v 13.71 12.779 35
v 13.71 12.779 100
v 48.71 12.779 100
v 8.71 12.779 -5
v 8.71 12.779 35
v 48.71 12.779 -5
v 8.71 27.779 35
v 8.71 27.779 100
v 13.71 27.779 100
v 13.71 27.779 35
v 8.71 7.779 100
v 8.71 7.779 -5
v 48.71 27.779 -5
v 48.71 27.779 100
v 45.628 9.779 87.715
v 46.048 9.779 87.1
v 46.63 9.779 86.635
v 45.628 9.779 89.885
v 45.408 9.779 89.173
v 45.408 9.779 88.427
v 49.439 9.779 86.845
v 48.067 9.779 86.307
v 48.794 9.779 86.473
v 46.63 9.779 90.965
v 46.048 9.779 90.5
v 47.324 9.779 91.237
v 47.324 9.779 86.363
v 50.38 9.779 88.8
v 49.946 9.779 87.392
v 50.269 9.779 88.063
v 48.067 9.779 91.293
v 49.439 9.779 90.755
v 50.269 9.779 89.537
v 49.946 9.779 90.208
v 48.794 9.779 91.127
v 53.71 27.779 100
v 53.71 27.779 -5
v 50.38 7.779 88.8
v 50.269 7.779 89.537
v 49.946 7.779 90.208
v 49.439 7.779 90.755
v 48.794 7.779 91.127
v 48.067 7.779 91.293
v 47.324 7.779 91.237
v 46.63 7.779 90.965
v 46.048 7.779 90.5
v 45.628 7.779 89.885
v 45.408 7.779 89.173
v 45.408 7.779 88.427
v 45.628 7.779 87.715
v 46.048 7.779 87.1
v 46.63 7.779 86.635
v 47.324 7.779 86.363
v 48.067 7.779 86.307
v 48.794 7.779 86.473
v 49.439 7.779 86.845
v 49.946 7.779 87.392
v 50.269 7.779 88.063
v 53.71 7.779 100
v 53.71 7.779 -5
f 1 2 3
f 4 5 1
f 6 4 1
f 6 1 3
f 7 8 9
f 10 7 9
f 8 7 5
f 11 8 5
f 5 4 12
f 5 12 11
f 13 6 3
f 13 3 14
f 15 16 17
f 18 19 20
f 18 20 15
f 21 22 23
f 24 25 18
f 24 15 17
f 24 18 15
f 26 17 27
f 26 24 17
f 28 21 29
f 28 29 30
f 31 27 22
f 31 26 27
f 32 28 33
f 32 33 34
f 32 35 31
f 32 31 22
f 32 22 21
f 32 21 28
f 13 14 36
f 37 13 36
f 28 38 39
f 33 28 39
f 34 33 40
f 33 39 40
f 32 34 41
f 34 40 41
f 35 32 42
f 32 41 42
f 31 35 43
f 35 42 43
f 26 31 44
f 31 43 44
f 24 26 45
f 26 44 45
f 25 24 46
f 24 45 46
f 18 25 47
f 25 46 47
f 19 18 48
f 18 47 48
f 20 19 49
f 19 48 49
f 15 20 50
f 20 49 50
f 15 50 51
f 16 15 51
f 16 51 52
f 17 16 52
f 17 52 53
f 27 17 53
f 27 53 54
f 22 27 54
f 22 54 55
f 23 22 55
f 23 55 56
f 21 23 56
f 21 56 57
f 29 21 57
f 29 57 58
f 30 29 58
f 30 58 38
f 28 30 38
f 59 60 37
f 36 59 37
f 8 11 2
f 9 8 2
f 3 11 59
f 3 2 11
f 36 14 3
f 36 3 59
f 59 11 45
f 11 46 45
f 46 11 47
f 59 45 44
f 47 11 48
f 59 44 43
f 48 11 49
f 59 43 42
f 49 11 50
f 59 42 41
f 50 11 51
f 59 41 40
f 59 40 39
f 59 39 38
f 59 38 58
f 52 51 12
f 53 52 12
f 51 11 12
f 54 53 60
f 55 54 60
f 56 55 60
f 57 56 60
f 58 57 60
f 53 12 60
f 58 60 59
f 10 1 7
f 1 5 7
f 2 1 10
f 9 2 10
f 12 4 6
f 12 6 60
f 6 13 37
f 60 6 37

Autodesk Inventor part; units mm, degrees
ref_plane "YZ Plane" through (0, 0, 0) normal (1, 0, 0) x (0, 1, 0)
ref_plane "XZ Plane" through (0, 0, 0) normal (0, 1, 0) x (-1, 0, 0)
ref_plane "XY Plane" through (0, 0, 0) normal (0, 0, 1) x (1, 0, 0)
sketch "Sketch1" plane through (0, 0, 0) normal (0, 0, 1) x (1, 0, 0)
  line L0 (13.7104, 12.7791) -> (48.7104, 12.7791)
  line L1 (48.7104, 12.7791) -> (48.7104, 27.7791)
  line L2 (13.7104, 12.7791) -> (13.7104, 27.7791)
  line L3 (8.7104, 27.7791) -> (8.7104, 7.7791)
  line L4 (8.7104, 7.7791) -> (53.7104, 7.7791)
  line L5 (53.7104, 7.7791) -> (53.7104, 27.7791)
  line L6 (8.7104, 27.7791) -> (13.7104, 27.7791)
  line L7 (48.7104, 27.7791) -> (53.7104, 27.7791)
  point P0 (0, 0)
  dimension "d0" = 35
  dimension "d1" = 15
  dimension "d2" = 15
  dimension "d3" = 5
extrude "Extrusion1" add sketch "Sketch1" along normal blind 100 and the other way blind 5
sketch "Sketch2" plane through (8.7104, 7.7791, -5) normal (0, -1, 0) x (1, 0, 0)
  circle A0 centre (39.17, 93.8) radius 2.5
  line L0 (45, 0) -> (45, 105) projected
  line L1 (0, 105) -> (45, 105) projected
  point P0 (-8.7104, 5)
  dimension "d6" = 5
  dimension "d7" = 5.83
  dimension "d8" = 11.2
extrude "Extrusion2" cut sketch "Sketch2" against normal blind 2
sketch "Sketch3" plane through (8.7104, 7.7791, 100) normal (-1, 0, 0) x (0, 0, 1)
  line L0 (-105, 20) -> (-105, 5) projected
  line L1 (-105, 5) -> (0, 5) projected
  line L2 (-105, 20) -> (-105, 5)
  line L3 (-105, 5) -> (-65, 5)
  line L4 (-65, 5) -> (-65, 20)
  line L5 (-65, 20) -> (-105, 20)
  point P0 (-100, -7.7791)
  dimension "d13" = 40
extrude "Extrusion3" cut sketch "Sketch3" against normal blind 10
sketch "Sketch4" plane through (0, 0, -5) normal (0, 0, -1) x (-1, 0, 0)
  line L0 (-53.7104, 27.7791) -> (-53.7104, 7.7791) projected
  line L1 (-53.7104, 7.7791) -> (-8.7104, 7.7791)
  line L2 (-17.7104, 42.7791) -> (-17.7104, 46.7534)
  line L3 (-17.7104, 46.7534) -> (-53.7104, 46.7534)
  line L4 (-53.7104, 46.7534) -> (-53.7104, 7.7791)
  line L5 (-48.7104, 12.7791) -> (-13.7104, 12.7791)
  line L6 (-10.7104, 42.7791) -> (-10.7104, 41.7534)
  line L7 (-10.7104, 41.7534) -> (-48.7104, 41.7534)
  line L8 (-48.7104, 41.7534) -> (-48.7104, 12.7791)
  line L9 (-17.7104, 42.7791) -> (-10.7104, 42.7791)
  line L10 (-8.7104, 12.7791) -> (-13.7104, 12.7791) projected
  line L11 (-13.7104, 12.7791) -> (-8.7104, 12.7791)
  line L12 (-8.7104, 12.7791) -> (-8.7104, 7.7791)
  line L13 (-17.7104, 42.7791) -> (-17.7104, 41.7534)
  point P0 (0, 0)
  point P1 (-17.7104, 44.7534)
  dimension "d16" = 36
  dimension "d17" = 40
  dimension "d18" = 5
  dimension "d19" = 30
ref_plane "Work Plane1" through (0, 0, -1) normal (0, 0, -1) x (-1, 0, 0)
sketch "Sketch5" plane through (0, 0, -1) normal (0, 0, -1) x (-1, 0, 0)
  line L0 (-8.7104, 12.7791) -> (-13.7104, 12.7791) projected
  line L1 (-48.7104, 27.7791) -> (-48.7104, 12.7791) projected
  line L2 (-8.7104, 12.7791) -> (-8.7104, 7.7791) projected
  line L3 (-8.7104, 12.7791) -> (-8.7104, 7.7791)
  line L4 (-8.7104, 7.7791) -> (-53.7104, 7.7791) projected
  line L5 (-8.7104, 7.7791) -> (-53.7104, 7.7791)
  line L6 (-53.7104, 7.7791) -> (-53.7104, 12.7791)
  line L7 (-53.7104, 12.7791) -> (-8.7104, 12.7791)
  point P0 (0, 0)
  point P1 (-48.7104, 41.7534)
  point P2 (-10.7104, 9.7791)
extrude "Extrusion6" add sketch "Sketch5" along normal blind 4
equation "\"BendRadius\" = Thickness"
equation "\"BendReliefWidth\" = Thickness"
equation "\"BendReliefDepth\" = 0.5 * Thickness"
equation "\"CornerReliefSize\" = 4 * Thickness"
equation "\"MinimumRemnant\" = 2 * Thickness"
equation "\"TransitionRadius\" = BendRadius"
equation "\"JacobiRadiusSize\" = BendRadius"
equation "\"Thickness\" = 0.5"
properties part number "inslide"
